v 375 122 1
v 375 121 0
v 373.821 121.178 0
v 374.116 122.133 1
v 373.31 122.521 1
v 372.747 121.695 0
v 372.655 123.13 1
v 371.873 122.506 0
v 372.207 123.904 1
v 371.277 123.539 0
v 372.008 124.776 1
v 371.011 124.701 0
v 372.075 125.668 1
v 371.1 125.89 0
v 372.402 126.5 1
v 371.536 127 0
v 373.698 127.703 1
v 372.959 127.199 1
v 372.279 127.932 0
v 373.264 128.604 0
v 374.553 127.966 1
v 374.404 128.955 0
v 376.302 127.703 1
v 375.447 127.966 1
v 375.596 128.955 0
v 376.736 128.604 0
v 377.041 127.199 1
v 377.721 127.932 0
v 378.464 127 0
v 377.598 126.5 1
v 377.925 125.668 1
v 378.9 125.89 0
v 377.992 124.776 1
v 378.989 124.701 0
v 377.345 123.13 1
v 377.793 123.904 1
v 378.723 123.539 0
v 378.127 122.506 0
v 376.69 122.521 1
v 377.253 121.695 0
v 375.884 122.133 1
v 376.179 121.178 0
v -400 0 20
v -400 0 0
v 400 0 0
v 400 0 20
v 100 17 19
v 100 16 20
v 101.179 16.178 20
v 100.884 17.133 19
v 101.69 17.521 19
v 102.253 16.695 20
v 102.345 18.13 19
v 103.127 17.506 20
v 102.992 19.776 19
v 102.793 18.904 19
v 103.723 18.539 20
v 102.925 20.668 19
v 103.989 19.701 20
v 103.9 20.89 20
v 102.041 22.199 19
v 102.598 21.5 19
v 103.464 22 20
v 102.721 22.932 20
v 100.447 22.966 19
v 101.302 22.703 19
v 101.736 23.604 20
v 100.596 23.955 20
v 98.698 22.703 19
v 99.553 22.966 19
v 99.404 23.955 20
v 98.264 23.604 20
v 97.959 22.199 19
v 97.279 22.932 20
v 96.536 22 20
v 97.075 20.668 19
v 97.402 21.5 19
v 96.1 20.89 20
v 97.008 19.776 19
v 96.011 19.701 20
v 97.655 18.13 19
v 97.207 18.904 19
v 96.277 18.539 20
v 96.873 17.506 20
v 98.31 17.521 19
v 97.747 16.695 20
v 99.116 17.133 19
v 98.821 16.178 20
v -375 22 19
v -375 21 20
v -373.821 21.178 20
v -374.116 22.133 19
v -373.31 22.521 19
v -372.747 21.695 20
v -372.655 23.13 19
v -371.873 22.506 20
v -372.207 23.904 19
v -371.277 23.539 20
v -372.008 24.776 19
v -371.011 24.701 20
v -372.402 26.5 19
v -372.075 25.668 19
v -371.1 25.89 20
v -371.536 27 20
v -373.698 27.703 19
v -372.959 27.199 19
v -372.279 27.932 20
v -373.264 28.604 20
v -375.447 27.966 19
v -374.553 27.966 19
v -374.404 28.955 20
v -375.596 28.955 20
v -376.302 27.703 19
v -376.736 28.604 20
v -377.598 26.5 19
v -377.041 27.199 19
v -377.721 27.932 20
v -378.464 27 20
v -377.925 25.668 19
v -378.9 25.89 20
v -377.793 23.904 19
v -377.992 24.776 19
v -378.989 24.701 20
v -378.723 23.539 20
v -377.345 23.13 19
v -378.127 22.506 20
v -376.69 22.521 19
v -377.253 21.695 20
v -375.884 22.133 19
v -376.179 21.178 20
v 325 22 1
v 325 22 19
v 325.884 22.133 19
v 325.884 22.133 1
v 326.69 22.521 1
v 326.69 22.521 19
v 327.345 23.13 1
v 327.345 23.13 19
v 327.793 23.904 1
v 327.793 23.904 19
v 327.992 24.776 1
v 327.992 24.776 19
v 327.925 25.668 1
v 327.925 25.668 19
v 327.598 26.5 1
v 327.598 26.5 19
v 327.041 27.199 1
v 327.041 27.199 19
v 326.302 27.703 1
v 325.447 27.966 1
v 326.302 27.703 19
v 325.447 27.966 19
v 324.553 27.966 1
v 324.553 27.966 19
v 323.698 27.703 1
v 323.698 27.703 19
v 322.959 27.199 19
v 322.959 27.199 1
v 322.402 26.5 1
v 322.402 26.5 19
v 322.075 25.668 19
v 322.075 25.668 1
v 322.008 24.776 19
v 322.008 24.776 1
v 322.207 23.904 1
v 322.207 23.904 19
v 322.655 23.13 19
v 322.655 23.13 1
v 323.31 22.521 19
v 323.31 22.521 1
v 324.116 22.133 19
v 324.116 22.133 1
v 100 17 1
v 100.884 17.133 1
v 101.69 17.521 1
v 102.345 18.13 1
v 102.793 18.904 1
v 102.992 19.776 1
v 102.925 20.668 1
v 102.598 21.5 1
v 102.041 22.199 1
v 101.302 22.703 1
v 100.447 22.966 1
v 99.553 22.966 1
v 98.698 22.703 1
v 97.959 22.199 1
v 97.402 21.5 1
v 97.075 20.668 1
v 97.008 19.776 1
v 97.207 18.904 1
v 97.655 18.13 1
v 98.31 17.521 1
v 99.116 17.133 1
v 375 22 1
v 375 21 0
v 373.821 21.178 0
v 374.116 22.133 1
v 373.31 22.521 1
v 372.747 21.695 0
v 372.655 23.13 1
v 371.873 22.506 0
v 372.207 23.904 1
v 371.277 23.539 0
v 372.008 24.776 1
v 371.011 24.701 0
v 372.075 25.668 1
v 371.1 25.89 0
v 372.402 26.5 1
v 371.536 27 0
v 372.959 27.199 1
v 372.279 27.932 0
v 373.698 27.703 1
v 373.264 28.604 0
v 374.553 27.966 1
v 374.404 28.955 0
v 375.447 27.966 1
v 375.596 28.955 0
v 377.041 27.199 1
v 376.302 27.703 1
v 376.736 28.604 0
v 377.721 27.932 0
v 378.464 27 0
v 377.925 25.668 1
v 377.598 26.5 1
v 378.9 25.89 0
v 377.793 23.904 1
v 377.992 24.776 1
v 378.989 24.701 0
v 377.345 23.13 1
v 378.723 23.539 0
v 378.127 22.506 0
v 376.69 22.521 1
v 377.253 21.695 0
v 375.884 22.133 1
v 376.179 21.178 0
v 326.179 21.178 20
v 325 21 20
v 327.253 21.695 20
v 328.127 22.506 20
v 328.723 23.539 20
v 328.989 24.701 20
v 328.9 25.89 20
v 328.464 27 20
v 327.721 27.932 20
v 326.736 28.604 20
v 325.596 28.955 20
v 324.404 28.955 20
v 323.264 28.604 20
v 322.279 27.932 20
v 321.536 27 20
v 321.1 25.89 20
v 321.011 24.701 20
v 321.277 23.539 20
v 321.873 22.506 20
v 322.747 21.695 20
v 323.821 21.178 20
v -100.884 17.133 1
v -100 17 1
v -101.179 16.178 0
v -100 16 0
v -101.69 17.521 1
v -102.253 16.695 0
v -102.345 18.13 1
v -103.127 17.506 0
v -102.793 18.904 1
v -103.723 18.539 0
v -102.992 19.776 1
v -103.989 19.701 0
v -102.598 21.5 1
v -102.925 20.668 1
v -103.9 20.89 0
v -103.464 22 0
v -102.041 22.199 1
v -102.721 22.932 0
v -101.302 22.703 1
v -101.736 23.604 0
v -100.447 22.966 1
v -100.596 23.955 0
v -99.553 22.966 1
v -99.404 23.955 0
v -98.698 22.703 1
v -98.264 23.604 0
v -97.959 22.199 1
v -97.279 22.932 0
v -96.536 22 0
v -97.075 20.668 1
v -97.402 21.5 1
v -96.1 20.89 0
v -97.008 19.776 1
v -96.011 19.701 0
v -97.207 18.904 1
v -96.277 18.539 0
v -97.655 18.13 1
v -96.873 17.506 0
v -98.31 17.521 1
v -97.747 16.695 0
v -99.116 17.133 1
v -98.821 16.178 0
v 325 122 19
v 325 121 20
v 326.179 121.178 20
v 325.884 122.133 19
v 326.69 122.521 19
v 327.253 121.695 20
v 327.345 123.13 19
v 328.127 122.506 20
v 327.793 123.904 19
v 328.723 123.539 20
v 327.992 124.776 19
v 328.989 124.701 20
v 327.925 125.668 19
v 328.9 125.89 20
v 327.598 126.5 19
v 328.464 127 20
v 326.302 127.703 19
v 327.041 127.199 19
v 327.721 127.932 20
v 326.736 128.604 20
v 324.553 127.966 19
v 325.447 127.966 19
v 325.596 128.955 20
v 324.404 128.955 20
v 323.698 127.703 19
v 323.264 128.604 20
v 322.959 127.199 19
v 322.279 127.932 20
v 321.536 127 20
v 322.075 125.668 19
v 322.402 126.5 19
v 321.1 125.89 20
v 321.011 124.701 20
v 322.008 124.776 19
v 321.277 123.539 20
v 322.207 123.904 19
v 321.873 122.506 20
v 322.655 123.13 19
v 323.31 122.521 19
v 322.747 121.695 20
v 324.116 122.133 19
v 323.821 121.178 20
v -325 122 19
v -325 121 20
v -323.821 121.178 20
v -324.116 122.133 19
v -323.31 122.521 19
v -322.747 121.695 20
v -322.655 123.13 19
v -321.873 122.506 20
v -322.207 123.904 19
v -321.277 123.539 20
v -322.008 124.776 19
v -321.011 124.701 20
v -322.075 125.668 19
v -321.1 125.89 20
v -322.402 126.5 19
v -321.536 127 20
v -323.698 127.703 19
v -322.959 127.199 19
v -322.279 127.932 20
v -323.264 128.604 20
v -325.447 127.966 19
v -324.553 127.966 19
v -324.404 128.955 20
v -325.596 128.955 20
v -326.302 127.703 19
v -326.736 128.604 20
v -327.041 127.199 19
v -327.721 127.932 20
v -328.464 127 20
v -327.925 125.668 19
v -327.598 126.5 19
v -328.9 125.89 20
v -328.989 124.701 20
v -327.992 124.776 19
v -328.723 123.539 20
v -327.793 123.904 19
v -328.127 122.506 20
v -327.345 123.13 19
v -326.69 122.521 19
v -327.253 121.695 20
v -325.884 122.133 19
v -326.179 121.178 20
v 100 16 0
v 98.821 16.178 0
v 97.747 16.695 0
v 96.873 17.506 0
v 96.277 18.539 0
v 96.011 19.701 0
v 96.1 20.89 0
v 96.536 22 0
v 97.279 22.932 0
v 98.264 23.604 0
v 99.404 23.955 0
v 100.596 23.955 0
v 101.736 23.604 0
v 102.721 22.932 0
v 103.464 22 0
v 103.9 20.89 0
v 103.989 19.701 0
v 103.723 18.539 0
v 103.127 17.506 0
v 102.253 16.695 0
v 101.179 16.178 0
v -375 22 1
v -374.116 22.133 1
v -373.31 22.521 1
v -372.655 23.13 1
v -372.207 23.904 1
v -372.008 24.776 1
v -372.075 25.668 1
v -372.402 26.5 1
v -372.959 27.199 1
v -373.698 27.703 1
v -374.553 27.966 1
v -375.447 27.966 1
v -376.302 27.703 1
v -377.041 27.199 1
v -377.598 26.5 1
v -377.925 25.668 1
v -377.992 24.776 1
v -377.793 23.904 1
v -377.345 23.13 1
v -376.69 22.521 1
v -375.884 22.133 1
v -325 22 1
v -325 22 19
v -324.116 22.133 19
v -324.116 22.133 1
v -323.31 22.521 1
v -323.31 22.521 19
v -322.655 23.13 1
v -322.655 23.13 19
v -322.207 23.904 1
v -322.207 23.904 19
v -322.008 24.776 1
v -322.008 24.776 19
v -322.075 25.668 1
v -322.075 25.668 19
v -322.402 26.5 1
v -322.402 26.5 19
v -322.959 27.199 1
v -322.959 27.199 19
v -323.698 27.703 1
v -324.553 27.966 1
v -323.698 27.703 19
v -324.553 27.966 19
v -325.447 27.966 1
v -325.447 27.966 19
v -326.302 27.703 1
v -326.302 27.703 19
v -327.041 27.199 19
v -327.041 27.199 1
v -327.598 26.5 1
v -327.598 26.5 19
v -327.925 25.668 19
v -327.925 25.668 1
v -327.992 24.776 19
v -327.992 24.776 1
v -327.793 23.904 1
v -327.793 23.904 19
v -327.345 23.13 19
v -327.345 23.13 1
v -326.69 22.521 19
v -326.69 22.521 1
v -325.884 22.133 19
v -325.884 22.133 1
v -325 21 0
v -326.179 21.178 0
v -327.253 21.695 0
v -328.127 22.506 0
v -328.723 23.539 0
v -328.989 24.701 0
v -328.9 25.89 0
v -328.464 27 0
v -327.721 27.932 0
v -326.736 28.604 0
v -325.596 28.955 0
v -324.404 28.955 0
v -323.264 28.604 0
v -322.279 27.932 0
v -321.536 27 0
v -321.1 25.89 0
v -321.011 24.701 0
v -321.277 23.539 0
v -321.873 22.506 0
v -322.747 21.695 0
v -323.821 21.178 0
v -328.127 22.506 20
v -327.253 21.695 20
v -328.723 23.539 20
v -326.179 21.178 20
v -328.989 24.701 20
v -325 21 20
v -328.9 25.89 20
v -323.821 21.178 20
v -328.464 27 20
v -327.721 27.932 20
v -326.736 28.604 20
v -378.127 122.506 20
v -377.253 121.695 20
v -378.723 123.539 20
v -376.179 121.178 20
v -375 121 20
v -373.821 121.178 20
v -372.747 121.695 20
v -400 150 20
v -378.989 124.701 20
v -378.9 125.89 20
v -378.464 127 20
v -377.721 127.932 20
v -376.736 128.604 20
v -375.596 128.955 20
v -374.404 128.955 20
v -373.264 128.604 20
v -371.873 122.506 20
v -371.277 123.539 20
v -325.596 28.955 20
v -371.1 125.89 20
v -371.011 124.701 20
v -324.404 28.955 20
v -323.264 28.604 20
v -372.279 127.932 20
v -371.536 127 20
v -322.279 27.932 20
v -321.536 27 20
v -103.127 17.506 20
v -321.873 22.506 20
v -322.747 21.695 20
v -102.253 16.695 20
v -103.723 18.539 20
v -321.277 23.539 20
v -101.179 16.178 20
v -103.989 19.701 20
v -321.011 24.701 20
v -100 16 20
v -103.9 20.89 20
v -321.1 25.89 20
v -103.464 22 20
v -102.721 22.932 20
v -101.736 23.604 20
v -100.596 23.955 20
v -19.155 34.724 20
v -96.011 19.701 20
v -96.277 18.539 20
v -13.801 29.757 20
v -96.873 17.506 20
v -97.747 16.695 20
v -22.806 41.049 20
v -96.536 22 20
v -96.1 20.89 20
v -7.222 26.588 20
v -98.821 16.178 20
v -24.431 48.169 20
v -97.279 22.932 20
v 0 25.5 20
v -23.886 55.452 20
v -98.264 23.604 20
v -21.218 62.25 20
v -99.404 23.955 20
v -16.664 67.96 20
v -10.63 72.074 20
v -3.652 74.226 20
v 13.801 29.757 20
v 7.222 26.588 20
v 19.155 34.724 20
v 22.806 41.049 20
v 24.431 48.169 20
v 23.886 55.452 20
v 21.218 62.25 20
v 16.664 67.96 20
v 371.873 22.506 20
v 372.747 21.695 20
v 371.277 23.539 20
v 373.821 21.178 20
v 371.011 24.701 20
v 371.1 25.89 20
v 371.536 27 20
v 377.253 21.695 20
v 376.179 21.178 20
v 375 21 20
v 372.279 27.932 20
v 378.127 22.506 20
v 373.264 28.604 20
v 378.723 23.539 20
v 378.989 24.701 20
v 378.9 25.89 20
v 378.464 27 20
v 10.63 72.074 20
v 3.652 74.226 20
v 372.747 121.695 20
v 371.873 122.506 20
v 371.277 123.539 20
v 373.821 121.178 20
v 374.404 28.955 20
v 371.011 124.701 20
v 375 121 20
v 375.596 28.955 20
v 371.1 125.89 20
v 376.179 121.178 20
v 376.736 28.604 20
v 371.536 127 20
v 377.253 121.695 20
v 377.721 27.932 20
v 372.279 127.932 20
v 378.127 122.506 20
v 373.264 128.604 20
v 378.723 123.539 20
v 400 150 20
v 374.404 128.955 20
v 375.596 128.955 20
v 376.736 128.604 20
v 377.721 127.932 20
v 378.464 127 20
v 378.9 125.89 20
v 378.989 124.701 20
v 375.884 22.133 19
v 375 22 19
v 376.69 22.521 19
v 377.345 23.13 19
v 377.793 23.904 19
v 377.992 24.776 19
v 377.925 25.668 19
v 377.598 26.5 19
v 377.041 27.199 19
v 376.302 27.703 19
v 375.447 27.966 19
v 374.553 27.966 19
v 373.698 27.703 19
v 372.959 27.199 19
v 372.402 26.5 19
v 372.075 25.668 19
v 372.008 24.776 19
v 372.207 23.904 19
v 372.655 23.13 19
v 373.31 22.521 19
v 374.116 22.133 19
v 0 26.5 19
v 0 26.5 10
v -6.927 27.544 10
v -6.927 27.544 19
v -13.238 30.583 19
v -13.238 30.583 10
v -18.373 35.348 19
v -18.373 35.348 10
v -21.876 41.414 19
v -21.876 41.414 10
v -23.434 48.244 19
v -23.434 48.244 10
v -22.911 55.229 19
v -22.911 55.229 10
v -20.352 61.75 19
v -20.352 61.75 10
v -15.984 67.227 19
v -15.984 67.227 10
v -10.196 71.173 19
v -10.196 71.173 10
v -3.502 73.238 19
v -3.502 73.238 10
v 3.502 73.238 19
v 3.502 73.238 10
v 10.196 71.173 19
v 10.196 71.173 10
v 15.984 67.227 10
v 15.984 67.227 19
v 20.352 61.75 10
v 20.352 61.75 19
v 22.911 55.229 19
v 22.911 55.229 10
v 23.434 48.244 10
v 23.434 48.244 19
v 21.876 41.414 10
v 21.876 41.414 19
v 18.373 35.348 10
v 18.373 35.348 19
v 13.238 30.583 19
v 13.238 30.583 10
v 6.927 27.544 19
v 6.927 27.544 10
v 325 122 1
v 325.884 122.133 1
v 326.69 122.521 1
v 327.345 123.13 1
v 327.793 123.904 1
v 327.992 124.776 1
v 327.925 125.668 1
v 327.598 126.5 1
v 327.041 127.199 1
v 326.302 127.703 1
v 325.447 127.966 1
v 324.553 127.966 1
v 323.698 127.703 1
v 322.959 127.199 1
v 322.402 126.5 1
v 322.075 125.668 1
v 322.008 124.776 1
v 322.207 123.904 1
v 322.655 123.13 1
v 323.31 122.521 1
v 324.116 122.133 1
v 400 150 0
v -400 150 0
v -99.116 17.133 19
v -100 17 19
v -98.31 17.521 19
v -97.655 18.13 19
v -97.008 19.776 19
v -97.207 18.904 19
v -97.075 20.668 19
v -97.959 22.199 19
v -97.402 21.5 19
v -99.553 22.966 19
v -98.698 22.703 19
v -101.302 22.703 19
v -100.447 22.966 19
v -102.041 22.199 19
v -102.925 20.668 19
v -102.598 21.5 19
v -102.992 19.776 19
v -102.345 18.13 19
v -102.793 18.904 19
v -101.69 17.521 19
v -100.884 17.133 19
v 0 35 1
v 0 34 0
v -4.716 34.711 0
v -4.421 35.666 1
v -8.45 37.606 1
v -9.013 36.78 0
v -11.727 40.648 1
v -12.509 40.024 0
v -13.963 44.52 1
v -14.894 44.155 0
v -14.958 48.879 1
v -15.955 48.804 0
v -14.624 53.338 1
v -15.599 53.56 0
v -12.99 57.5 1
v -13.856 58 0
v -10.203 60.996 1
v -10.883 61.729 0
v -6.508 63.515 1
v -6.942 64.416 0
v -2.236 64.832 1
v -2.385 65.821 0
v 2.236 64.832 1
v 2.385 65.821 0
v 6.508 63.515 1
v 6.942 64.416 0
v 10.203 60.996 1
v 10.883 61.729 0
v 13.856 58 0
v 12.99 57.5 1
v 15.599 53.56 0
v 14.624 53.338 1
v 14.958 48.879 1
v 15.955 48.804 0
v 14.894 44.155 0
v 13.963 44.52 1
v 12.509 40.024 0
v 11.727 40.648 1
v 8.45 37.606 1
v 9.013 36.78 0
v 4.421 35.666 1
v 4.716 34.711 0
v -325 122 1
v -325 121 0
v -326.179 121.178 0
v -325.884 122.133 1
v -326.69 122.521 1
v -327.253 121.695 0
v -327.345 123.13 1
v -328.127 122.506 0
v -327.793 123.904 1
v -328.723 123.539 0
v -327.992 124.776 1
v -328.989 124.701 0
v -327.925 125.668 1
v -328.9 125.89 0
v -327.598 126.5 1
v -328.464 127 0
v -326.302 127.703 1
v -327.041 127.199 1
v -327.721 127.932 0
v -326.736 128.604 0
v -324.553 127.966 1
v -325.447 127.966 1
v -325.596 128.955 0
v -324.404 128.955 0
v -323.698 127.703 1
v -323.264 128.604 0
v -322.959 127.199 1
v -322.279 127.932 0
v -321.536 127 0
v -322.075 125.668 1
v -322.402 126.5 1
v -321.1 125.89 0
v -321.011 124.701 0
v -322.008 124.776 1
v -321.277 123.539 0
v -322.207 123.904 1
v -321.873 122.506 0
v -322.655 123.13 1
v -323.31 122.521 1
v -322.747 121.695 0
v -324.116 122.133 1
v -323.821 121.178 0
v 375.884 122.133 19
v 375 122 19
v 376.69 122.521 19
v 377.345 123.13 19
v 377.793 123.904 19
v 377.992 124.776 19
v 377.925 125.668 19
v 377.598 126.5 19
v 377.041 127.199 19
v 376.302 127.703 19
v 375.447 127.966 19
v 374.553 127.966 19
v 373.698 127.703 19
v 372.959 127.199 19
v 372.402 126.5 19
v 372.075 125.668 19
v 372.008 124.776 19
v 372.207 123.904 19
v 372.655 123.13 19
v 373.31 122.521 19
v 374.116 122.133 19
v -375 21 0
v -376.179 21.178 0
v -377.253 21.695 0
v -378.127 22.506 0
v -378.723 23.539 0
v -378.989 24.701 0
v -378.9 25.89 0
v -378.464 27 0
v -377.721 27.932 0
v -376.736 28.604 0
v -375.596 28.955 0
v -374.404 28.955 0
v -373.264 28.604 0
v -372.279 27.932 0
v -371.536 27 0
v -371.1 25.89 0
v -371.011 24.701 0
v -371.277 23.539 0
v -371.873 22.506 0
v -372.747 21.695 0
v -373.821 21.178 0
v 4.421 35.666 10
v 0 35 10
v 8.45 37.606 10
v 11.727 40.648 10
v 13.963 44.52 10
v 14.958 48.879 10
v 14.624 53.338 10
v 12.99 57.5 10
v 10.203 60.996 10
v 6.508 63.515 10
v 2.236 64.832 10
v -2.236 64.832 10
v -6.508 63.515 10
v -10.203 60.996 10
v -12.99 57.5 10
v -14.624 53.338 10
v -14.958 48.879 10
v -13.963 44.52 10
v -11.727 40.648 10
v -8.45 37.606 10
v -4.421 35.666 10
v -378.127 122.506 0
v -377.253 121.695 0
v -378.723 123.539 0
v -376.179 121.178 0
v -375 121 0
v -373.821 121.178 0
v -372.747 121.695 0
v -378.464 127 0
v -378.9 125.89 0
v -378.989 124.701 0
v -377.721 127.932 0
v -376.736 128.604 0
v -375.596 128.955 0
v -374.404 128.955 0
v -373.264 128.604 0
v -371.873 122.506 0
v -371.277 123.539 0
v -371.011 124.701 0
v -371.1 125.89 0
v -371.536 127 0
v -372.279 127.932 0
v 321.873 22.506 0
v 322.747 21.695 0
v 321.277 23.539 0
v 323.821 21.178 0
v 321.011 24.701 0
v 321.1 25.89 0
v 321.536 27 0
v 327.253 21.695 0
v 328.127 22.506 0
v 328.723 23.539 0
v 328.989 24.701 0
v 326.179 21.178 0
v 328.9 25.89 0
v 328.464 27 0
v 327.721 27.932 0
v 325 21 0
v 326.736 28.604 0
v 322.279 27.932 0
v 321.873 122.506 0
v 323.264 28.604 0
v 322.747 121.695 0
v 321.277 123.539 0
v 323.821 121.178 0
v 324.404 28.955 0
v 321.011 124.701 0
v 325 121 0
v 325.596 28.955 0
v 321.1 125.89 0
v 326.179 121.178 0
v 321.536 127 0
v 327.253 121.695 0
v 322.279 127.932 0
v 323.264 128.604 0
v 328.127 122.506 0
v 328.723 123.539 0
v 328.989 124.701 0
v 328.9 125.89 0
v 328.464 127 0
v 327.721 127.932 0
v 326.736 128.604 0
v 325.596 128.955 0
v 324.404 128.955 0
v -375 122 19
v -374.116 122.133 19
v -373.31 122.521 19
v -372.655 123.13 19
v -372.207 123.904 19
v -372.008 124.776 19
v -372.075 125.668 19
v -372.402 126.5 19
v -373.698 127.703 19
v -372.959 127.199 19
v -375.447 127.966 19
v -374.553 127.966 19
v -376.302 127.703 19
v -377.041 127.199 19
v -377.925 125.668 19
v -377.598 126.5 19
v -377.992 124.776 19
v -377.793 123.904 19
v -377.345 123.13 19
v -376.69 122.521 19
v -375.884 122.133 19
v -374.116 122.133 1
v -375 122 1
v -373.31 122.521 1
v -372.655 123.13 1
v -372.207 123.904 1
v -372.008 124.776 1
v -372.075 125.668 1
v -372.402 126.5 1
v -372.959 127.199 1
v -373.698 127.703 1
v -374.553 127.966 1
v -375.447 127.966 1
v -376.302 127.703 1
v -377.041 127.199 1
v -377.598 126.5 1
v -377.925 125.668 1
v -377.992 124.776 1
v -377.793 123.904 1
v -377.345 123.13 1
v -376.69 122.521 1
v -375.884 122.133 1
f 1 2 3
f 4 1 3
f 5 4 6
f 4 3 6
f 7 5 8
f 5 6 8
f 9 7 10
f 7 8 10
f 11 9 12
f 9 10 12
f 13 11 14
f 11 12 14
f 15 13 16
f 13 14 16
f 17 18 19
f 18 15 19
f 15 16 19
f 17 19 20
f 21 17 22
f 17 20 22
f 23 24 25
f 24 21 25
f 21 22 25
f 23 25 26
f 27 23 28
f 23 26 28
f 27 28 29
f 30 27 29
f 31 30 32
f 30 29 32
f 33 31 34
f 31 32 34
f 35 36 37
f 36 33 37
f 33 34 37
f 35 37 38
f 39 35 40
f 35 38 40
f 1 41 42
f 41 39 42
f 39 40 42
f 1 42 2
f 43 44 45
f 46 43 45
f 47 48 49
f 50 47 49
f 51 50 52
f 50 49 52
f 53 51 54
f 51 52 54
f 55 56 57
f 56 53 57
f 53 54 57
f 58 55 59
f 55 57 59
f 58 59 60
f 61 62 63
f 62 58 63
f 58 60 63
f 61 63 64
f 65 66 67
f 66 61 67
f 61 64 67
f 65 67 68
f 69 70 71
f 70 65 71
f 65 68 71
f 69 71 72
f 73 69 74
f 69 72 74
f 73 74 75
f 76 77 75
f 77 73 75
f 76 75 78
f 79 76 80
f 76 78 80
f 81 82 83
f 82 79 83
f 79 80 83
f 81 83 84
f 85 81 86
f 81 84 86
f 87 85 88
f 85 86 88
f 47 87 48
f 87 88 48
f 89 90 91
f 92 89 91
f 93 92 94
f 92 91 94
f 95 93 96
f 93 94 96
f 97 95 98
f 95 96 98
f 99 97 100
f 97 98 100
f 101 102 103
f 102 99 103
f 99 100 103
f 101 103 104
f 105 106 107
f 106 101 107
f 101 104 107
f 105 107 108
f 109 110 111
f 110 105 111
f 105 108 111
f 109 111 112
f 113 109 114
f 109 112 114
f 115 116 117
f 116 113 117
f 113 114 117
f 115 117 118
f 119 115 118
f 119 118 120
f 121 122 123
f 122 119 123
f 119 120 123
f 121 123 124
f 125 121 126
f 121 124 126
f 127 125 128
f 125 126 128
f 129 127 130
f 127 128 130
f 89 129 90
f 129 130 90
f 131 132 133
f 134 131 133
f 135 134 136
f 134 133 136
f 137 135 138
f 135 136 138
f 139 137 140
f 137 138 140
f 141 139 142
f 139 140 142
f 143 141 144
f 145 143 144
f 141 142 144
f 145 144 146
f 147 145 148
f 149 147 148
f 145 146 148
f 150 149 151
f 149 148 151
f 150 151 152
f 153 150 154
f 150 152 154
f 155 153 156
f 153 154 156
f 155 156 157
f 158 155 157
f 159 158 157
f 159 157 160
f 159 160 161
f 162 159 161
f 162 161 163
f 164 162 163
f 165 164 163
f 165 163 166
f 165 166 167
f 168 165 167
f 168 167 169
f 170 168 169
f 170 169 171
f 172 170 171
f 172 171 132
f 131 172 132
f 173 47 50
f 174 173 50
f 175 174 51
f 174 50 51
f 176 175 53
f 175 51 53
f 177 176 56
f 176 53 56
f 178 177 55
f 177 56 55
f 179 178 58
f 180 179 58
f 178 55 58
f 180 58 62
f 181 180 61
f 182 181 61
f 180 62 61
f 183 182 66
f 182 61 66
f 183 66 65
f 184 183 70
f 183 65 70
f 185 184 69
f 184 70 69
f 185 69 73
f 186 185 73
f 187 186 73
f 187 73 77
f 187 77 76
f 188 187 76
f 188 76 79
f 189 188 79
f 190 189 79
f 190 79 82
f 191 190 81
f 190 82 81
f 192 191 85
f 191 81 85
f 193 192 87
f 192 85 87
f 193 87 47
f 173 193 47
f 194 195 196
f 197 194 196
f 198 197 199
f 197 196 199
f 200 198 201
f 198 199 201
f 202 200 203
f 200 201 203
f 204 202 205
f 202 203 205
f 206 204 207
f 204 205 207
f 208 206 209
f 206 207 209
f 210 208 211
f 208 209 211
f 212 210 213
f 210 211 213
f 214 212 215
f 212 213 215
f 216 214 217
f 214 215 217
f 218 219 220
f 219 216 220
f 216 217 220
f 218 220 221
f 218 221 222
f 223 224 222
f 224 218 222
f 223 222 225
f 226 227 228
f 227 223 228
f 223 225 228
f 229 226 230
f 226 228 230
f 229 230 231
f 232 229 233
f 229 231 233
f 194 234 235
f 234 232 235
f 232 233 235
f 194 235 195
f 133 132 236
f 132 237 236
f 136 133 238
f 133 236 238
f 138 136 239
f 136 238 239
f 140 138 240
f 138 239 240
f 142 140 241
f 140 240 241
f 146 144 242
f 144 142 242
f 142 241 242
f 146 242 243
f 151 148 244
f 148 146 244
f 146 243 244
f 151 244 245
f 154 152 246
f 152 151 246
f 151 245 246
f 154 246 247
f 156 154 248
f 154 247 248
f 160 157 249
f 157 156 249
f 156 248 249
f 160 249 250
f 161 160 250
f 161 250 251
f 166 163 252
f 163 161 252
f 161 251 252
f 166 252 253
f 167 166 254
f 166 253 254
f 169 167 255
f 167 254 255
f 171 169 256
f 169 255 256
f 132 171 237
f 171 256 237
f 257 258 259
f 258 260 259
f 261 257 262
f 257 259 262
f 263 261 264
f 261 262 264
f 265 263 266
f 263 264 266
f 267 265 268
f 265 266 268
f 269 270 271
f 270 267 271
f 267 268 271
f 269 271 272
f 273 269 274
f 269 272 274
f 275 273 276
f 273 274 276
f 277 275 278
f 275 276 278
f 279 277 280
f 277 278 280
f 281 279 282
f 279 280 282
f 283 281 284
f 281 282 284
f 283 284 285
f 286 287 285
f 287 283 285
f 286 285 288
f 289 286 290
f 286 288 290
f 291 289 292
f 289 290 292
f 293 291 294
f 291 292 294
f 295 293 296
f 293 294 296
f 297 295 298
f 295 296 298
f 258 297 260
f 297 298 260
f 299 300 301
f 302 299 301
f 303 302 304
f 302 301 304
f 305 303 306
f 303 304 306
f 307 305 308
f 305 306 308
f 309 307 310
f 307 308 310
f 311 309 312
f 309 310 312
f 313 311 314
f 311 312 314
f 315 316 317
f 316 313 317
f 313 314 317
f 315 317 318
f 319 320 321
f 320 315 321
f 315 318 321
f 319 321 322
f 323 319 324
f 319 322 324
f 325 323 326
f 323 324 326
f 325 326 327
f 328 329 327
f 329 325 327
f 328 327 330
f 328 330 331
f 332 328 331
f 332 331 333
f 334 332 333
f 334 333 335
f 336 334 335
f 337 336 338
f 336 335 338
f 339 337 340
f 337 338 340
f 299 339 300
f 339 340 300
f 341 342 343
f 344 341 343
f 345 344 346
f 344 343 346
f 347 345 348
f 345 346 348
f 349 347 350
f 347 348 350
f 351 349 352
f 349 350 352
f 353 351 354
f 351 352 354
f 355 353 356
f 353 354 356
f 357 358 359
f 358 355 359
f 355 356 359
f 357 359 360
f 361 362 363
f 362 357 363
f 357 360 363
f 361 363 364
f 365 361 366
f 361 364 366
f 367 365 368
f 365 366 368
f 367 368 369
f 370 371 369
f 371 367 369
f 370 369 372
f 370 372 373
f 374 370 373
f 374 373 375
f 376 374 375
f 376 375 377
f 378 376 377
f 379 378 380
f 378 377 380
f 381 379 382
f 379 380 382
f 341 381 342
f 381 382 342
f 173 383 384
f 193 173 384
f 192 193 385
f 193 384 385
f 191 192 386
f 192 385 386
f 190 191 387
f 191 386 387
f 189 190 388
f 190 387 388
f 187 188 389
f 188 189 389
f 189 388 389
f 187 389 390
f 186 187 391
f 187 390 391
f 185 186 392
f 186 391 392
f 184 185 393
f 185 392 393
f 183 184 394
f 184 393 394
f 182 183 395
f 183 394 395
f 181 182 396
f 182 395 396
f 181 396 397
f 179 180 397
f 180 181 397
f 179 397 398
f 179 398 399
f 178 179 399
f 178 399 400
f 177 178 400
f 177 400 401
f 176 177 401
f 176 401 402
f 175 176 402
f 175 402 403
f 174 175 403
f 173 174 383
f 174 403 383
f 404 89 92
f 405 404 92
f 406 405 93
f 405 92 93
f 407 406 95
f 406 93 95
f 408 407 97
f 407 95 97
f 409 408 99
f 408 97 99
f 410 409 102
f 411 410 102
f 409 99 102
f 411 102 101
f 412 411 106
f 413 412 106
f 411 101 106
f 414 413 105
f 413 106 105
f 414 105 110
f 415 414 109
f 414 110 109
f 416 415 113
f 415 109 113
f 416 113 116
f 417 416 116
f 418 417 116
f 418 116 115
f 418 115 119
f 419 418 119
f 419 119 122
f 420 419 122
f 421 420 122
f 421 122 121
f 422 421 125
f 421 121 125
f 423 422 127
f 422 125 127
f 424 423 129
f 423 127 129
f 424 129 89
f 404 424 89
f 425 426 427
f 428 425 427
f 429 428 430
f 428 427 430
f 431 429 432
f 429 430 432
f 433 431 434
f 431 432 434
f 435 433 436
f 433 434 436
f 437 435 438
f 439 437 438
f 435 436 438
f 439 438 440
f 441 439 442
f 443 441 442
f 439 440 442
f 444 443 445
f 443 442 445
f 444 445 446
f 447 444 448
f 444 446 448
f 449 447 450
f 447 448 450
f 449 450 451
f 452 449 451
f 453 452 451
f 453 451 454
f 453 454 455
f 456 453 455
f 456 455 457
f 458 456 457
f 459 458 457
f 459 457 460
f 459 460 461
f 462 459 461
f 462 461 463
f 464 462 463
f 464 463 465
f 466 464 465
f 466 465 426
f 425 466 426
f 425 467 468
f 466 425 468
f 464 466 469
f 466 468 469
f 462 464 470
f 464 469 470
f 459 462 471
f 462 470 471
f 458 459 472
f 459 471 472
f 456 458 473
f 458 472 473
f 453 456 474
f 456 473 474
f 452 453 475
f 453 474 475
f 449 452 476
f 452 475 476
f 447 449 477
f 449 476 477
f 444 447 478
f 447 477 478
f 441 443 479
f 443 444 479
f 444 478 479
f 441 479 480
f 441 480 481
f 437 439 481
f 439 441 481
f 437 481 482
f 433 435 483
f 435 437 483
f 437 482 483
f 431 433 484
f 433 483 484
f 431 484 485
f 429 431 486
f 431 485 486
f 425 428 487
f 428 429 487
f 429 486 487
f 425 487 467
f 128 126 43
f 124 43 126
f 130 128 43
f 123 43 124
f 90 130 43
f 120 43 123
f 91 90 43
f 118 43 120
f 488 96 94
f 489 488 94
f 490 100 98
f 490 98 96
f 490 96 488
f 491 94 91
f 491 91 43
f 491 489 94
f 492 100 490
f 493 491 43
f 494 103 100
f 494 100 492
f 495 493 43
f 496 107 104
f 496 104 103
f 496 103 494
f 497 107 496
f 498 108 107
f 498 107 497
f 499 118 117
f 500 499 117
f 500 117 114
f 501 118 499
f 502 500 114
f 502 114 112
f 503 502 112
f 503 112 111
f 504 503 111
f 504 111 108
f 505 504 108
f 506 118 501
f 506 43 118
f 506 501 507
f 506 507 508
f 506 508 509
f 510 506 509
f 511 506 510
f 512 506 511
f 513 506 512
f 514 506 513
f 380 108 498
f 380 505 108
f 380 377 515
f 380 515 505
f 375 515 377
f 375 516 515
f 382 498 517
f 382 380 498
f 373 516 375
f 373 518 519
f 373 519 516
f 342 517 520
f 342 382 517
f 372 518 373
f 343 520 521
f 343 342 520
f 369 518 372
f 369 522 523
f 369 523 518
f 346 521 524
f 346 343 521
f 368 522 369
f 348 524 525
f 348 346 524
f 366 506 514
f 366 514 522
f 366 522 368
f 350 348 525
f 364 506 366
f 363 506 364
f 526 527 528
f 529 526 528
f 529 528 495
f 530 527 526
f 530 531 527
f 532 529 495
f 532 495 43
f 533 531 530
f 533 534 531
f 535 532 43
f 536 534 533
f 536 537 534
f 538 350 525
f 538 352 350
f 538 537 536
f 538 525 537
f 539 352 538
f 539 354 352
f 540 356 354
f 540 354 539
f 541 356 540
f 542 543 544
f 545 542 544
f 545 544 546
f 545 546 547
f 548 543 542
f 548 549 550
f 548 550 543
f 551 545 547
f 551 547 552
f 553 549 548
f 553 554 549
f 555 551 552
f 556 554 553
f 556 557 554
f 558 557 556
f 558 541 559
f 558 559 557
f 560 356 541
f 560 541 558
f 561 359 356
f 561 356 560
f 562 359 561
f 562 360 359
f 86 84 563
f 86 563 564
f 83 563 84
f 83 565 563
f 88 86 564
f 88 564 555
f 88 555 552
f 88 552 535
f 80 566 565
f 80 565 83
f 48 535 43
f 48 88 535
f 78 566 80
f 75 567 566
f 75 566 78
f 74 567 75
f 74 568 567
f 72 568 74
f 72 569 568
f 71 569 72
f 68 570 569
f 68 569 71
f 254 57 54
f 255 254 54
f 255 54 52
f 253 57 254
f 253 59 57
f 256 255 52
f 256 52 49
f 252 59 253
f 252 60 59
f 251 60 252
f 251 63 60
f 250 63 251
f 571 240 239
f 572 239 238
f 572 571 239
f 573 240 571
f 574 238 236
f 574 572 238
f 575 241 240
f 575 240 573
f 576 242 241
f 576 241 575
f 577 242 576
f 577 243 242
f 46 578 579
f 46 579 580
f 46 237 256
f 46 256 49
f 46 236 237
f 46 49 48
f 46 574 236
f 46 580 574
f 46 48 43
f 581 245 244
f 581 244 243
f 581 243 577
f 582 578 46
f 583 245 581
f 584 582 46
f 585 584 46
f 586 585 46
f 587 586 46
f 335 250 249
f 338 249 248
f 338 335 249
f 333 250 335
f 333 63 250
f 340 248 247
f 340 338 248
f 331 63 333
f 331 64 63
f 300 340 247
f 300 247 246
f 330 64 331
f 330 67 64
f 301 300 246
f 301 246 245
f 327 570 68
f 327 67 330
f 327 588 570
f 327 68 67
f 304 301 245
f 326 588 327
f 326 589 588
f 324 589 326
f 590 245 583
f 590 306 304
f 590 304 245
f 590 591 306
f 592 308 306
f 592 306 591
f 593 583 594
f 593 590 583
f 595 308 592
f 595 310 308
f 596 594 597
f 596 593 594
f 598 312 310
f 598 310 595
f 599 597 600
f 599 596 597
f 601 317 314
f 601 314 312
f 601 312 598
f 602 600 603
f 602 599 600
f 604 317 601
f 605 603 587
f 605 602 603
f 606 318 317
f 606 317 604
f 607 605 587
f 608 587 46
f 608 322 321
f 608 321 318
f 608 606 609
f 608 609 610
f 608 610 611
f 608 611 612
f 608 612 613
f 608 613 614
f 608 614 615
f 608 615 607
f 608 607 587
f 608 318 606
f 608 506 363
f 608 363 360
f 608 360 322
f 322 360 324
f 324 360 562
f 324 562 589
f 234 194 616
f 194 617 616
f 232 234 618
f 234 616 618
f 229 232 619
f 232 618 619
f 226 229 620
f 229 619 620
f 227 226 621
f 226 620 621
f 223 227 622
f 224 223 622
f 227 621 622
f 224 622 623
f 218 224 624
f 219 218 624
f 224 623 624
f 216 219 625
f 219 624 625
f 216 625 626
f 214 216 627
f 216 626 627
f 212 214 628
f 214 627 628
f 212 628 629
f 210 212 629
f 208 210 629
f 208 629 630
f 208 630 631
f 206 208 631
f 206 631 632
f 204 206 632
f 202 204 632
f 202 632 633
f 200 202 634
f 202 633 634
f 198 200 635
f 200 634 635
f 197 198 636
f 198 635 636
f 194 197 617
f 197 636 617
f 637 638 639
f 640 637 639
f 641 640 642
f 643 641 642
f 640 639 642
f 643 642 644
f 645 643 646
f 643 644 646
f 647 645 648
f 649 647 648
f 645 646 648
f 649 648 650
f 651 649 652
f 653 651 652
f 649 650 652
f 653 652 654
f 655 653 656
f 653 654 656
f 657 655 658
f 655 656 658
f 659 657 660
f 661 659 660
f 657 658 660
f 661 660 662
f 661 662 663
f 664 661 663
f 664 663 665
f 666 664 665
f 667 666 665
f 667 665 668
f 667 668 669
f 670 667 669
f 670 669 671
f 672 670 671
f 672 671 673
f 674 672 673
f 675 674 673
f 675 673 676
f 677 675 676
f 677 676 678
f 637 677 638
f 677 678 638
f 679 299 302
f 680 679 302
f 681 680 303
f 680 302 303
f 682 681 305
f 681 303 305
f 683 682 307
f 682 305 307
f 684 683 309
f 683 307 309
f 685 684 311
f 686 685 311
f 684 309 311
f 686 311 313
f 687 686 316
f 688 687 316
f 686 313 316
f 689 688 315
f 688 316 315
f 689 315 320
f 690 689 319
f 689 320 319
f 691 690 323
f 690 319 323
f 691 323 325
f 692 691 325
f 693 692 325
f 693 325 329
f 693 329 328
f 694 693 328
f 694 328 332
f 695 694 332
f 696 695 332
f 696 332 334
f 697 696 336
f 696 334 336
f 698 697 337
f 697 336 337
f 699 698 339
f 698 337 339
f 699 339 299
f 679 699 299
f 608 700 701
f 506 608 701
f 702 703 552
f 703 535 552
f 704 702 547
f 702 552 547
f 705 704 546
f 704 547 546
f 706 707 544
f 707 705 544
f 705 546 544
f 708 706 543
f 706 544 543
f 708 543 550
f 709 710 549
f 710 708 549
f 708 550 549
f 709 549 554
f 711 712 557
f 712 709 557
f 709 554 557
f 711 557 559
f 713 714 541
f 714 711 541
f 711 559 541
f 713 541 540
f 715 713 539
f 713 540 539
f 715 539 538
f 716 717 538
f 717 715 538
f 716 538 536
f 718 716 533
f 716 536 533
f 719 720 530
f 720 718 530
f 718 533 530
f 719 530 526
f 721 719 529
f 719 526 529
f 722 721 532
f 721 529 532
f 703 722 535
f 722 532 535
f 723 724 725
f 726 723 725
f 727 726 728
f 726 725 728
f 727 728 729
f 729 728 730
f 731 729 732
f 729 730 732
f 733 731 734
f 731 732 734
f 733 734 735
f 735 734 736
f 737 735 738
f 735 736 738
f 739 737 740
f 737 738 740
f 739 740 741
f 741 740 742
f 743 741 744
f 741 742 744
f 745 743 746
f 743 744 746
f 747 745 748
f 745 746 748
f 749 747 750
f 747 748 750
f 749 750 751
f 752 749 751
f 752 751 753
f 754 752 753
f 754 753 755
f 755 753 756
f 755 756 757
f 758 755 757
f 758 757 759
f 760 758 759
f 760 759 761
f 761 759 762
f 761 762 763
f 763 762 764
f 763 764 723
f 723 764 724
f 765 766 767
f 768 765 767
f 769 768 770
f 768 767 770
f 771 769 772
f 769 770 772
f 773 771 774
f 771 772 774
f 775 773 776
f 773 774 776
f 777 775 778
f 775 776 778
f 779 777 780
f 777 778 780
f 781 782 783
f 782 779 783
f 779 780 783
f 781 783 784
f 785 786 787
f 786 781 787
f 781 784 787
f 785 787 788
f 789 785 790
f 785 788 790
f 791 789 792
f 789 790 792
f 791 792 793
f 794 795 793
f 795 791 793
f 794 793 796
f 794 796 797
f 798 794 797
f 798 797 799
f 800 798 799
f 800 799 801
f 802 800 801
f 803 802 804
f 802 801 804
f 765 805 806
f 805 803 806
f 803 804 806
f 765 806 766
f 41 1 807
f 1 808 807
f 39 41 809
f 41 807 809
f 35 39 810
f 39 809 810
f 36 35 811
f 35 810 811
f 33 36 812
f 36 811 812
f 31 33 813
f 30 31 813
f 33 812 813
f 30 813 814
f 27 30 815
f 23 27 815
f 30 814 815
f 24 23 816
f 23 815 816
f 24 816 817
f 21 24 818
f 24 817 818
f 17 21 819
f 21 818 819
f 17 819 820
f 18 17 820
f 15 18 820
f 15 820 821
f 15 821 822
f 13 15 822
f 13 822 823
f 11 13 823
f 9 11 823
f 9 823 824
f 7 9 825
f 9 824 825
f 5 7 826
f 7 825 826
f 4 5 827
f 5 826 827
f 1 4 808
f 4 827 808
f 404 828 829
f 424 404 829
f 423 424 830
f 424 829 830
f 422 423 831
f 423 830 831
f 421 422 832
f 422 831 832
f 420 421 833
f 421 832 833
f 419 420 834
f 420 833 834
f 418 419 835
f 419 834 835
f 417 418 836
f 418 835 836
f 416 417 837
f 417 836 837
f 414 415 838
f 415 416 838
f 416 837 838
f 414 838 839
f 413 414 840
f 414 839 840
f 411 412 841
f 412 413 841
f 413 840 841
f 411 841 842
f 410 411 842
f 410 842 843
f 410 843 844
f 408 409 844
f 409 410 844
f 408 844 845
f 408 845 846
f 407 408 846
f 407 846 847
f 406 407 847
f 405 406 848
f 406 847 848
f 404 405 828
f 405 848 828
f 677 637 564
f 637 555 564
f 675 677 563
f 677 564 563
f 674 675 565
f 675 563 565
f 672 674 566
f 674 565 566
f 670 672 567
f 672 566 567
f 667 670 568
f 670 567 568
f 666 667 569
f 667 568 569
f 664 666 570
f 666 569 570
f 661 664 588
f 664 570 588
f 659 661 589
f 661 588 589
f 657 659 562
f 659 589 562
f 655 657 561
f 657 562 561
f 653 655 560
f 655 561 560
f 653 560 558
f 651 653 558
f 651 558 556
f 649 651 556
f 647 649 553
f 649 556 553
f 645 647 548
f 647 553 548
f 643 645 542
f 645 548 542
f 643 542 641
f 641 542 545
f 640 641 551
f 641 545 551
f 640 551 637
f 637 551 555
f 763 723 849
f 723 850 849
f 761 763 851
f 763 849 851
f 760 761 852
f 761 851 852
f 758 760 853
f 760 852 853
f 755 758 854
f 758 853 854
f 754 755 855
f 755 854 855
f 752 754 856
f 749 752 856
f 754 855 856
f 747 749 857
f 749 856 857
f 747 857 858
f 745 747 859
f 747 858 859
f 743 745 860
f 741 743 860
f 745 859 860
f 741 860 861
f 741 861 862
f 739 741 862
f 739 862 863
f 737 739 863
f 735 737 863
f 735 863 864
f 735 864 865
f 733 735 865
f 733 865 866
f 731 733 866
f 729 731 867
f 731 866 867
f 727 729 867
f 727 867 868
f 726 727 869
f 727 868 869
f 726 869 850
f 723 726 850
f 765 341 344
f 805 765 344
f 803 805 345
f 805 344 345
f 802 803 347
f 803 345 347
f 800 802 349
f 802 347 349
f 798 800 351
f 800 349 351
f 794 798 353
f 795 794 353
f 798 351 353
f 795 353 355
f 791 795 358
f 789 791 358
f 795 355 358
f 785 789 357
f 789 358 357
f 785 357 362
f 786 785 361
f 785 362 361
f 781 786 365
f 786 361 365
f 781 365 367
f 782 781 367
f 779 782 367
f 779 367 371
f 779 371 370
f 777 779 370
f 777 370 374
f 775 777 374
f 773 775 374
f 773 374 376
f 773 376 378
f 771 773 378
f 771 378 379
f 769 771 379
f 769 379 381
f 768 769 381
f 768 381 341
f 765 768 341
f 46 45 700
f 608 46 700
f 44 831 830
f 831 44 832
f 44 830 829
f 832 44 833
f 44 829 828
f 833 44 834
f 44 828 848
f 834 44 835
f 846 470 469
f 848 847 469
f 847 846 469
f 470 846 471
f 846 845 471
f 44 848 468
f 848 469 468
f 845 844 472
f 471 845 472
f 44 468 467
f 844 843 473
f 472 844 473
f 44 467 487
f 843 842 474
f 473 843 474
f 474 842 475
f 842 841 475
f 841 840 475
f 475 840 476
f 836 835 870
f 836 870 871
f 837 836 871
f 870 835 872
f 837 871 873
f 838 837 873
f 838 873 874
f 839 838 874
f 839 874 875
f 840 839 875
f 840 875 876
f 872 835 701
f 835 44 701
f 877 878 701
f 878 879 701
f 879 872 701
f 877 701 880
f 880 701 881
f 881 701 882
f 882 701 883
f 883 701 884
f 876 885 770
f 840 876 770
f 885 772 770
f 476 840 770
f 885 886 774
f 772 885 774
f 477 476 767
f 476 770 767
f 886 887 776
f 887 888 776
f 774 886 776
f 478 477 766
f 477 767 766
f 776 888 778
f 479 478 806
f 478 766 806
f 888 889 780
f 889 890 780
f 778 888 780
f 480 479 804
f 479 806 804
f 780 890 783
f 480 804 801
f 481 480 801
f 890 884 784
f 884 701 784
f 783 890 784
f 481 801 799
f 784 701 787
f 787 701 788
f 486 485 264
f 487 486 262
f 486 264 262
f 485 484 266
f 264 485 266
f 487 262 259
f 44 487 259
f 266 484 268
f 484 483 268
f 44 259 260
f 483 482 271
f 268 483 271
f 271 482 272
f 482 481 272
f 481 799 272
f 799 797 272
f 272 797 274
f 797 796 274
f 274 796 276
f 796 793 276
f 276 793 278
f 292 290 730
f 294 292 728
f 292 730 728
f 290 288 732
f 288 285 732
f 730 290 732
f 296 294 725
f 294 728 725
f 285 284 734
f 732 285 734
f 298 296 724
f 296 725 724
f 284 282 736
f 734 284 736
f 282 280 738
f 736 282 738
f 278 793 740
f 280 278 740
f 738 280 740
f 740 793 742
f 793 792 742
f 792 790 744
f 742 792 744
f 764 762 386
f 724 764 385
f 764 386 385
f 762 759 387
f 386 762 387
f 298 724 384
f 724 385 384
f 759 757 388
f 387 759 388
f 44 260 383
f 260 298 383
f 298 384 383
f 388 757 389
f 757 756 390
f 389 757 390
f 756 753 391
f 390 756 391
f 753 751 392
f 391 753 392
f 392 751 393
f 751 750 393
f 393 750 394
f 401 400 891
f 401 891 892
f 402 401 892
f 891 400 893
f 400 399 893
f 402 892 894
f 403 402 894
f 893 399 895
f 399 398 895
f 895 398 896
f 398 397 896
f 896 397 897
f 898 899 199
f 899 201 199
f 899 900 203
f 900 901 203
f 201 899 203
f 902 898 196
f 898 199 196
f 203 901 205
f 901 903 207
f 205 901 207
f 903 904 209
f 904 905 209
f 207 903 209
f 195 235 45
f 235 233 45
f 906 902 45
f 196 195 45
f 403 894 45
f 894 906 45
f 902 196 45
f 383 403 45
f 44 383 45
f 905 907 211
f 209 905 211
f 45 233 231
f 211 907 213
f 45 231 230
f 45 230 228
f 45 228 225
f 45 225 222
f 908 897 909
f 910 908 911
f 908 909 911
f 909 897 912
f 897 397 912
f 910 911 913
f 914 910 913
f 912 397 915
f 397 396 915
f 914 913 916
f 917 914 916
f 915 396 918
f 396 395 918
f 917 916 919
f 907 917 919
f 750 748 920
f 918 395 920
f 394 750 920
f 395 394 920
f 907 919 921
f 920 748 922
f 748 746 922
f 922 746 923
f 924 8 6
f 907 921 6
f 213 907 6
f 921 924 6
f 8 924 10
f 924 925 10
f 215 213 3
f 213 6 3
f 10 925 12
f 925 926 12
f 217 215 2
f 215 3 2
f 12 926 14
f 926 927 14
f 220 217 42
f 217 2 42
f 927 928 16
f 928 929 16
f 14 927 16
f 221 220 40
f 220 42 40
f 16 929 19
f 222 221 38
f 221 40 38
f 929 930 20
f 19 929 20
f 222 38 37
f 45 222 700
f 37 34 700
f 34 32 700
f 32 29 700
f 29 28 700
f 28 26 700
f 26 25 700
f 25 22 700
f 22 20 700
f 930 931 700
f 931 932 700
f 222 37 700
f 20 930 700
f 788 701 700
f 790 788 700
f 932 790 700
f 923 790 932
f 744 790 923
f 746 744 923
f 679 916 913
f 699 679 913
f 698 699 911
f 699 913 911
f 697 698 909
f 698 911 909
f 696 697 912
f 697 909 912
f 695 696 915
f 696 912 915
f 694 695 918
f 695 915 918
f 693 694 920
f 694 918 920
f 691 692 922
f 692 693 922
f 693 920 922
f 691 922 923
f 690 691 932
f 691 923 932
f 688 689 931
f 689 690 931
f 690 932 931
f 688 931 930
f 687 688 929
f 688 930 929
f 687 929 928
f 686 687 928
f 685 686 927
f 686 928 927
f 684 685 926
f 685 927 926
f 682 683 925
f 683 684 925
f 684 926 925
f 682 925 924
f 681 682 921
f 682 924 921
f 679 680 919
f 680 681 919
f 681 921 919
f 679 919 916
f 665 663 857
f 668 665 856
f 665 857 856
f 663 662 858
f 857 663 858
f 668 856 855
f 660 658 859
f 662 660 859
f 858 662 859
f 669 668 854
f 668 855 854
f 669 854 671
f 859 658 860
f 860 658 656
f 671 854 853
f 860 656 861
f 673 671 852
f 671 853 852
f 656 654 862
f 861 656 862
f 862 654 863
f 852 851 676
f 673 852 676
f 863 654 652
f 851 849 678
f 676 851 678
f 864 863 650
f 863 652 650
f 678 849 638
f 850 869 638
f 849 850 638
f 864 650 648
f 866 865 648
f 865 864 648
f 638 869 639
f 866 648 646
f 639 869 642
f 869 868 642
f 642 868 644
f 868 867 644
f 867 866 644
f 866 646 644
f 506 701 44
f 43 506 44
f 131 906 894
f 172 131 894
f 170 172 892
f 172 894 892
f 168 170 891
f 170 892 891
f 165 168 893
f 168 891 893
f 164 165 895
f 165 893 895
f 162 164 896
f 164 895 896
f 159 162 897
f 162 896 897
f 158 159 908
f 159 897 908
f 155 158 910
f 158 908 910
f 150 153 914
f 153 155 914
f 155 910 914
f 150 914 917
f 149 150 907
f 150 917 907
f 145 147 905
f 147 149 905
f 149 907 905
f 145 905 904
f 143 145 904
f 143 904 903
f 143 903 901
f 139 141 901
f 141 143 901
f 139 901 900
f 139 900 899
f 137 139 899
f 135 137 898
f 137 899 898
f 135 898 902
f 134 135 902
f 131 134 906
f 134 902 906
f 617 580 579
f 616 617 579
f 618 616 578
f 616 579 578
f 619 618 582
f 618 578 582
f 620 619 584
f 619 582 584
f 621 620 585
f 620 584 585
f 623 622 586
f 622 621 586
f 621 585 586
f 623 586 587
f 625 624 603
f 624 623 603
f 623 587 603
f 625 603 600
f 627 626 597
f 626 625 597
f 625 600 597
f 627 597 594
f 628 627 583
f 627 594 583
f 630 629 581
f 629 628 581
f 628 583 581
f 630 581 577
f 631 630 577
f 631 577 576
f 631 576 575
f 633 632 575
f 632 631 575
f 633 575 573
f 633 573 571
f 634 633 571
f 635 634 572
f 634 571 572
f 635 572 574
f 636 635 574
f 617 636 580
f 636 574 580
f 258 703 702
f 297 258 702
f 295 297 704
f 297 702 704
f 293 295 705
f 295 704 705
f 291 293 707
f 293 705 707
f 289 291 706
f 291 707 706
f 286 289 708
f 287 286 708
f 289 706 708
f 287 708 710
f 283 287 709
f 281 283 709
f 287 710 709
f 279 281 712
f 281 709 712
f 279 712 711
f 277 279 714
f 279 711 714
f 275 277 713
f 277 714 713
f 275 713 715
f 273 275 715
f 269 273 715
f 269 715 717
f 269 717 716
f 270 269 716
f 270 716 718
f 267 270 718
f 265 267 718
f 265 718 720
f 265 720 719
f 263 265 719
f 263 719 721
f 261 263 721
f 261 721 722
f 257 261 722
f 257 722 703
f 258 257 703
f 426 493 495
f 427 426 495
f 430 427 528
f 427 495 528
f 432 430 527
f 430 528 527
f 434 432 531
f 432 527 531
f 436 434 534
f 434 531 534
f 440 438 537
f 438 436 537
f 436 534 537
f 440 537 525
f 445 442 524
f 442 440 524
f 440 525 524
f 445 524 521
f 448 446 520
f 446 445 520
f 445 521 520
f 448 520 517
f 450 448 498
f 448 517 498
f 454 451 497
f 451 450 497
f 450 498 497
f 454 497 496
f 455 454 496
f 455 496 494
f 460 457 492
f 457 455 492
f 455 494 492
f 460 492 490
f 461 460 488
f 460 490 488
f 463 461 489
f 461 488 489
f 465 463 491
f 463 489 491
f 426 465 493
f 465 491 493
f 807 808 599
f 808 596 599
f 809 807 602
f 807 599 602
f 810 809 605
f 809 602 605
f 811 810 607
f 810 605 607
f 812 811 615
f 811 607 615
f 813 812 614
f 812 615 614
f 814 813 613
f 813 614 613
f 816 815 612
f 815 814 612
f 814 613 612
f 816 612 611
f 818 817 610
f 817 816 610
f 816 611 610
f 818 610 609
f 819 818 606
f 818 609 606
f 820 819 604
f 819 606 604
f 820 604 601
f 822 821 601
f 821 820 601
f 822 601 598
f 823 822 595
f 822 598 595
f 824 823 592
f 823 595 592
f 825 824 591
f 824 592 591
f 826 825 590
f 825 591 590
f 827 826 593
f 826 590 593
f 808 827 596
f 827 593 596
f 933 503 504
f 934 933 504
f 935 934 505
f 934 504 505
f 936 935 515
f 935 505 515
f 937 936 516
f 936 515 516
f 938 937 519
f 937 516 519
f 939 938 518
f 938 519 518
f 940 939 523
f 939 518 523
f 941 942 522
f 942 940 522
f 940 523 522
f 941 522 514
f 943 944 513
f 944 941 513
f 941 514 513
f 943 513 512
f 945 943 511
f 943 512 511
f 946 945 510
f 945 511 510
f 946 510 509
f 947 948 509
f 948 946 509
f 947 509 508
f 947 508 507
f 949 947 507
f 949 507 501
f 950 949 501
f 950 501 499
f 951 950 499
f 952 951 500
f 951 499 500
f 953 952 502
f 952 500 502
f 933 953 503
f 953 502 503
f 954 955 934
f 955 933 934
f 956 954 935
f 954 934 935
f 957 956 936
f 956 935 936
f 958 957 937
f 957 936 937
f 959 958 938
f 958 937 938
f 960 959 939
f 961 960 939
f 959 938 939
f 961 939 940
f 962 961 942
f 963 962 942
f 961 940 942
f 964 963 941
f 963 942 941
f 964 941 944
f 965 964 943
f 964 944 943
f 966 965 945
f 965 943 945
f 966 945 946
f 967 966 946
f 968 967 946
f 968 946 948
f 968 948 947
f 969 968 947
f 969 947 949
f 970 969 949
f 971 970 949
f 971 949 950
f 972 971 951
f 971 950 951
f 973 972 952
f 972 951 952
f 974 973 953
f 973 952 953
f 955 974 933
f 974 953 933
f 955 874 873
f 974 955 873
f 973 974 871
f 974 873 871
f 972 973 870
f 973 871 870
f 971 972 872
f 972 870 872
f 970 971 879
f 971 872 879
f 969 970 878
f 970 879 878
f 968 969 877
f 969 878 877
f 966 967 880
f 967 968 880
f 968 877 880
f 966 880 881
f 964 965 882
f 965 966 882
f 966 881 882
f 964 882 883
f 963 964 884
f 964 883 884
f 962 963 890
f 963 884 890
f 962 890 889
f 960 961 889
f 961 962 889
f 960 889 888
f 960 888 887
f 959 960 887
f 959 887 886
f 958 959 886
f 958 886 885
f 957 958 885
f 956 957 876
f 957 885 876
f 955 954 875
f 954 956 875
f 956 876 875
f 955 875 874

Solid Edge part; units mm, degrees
sketch "Sketch1" plane through (0, 0, 0) normal (0, 0, 1) x (1, 0, 0)
  line L0 (400, 150) -> (-400, 150)
  line L1 (-400, 150) -> (-400, 0)
  line L2 (-400, 0) -> (400, 0)
  line L3 (400, 0) -> (400, 150)
extrude "Protrusion1" add sketch "Sketch1" along normal blind 20
hole "Hole1" at (-375, 125, 20) direction (0, 0, -1) diameter 6 end through all start chamfer 1 start chamfer angle 45 end chamfer 1 end chamfer angle 45
hole "Hole2" at (-325, 125, 20) direction (0, 0, -1) diameter 6 end through all start chamfer 1 start chamfer angle 45 end chamfer 1 end chamfer angle 45
hole "Hole3" at (-325, 25, 20) direction (0, 0, -1) diameter 6 end through all start chamfer 1 start chamfer angle 45 end chamfer 1 end chamfer angle 45
hole "Hole4" at (-375, 25, 20) direction (0, 0, -1) diameter 6 end through all start chamfer 1 start chamfer angle 45 end chamfer 1 end chamfer angle 45
hole "Hole5" at (325, 125, 20) direction (0, 0, -1) diameter 6 end through all start chamfer 1 start chamfer angle 45 end chamfer 1 end chamfer angle 45
hole "Hole6" at (375, 125, 20) direction (0, 0, -1) diameter 6 end through all start chamfer 1 start chamfer angle 45 end chamfer 1 end chamfer angle 45
hole "Hole7" at (375, 25, 20) direction (0, 0, -1) diameter 6 end through all start chamfer 1 start chamfer angle 45 end chamfer 1 end chamfer angle 45
hole "Hole8" at (325, 25, 20) direction (0, 0, -1) diameter 6 end through all start chamfer 1 start chamfer angle 45 end chamfer 1 end chamfer angle 45
hole "Stufenbohrung_Axiallager" at (0, 50, 20) direction (0, 0, -1) diameter 30 end through all counterbore diameter 47 counterbore depth 10 start chamfer 1 start chamfer angle 45 end chamfer 1 end chamfer angle 45
hole "Hole9" at (-100, 20, 20) direction (0, 0, -1) diameter 6 end through all start chamfer 1 start chamfer angle 45 end chamfer 1 end chamfer angle 45
hole "Hole10" at (100, 20, 20) direction (0, 0, -1) diameter 6 end through all start chamfer 1 start chamfer angle 45 end chamfer 1 end chamfer angle 45
